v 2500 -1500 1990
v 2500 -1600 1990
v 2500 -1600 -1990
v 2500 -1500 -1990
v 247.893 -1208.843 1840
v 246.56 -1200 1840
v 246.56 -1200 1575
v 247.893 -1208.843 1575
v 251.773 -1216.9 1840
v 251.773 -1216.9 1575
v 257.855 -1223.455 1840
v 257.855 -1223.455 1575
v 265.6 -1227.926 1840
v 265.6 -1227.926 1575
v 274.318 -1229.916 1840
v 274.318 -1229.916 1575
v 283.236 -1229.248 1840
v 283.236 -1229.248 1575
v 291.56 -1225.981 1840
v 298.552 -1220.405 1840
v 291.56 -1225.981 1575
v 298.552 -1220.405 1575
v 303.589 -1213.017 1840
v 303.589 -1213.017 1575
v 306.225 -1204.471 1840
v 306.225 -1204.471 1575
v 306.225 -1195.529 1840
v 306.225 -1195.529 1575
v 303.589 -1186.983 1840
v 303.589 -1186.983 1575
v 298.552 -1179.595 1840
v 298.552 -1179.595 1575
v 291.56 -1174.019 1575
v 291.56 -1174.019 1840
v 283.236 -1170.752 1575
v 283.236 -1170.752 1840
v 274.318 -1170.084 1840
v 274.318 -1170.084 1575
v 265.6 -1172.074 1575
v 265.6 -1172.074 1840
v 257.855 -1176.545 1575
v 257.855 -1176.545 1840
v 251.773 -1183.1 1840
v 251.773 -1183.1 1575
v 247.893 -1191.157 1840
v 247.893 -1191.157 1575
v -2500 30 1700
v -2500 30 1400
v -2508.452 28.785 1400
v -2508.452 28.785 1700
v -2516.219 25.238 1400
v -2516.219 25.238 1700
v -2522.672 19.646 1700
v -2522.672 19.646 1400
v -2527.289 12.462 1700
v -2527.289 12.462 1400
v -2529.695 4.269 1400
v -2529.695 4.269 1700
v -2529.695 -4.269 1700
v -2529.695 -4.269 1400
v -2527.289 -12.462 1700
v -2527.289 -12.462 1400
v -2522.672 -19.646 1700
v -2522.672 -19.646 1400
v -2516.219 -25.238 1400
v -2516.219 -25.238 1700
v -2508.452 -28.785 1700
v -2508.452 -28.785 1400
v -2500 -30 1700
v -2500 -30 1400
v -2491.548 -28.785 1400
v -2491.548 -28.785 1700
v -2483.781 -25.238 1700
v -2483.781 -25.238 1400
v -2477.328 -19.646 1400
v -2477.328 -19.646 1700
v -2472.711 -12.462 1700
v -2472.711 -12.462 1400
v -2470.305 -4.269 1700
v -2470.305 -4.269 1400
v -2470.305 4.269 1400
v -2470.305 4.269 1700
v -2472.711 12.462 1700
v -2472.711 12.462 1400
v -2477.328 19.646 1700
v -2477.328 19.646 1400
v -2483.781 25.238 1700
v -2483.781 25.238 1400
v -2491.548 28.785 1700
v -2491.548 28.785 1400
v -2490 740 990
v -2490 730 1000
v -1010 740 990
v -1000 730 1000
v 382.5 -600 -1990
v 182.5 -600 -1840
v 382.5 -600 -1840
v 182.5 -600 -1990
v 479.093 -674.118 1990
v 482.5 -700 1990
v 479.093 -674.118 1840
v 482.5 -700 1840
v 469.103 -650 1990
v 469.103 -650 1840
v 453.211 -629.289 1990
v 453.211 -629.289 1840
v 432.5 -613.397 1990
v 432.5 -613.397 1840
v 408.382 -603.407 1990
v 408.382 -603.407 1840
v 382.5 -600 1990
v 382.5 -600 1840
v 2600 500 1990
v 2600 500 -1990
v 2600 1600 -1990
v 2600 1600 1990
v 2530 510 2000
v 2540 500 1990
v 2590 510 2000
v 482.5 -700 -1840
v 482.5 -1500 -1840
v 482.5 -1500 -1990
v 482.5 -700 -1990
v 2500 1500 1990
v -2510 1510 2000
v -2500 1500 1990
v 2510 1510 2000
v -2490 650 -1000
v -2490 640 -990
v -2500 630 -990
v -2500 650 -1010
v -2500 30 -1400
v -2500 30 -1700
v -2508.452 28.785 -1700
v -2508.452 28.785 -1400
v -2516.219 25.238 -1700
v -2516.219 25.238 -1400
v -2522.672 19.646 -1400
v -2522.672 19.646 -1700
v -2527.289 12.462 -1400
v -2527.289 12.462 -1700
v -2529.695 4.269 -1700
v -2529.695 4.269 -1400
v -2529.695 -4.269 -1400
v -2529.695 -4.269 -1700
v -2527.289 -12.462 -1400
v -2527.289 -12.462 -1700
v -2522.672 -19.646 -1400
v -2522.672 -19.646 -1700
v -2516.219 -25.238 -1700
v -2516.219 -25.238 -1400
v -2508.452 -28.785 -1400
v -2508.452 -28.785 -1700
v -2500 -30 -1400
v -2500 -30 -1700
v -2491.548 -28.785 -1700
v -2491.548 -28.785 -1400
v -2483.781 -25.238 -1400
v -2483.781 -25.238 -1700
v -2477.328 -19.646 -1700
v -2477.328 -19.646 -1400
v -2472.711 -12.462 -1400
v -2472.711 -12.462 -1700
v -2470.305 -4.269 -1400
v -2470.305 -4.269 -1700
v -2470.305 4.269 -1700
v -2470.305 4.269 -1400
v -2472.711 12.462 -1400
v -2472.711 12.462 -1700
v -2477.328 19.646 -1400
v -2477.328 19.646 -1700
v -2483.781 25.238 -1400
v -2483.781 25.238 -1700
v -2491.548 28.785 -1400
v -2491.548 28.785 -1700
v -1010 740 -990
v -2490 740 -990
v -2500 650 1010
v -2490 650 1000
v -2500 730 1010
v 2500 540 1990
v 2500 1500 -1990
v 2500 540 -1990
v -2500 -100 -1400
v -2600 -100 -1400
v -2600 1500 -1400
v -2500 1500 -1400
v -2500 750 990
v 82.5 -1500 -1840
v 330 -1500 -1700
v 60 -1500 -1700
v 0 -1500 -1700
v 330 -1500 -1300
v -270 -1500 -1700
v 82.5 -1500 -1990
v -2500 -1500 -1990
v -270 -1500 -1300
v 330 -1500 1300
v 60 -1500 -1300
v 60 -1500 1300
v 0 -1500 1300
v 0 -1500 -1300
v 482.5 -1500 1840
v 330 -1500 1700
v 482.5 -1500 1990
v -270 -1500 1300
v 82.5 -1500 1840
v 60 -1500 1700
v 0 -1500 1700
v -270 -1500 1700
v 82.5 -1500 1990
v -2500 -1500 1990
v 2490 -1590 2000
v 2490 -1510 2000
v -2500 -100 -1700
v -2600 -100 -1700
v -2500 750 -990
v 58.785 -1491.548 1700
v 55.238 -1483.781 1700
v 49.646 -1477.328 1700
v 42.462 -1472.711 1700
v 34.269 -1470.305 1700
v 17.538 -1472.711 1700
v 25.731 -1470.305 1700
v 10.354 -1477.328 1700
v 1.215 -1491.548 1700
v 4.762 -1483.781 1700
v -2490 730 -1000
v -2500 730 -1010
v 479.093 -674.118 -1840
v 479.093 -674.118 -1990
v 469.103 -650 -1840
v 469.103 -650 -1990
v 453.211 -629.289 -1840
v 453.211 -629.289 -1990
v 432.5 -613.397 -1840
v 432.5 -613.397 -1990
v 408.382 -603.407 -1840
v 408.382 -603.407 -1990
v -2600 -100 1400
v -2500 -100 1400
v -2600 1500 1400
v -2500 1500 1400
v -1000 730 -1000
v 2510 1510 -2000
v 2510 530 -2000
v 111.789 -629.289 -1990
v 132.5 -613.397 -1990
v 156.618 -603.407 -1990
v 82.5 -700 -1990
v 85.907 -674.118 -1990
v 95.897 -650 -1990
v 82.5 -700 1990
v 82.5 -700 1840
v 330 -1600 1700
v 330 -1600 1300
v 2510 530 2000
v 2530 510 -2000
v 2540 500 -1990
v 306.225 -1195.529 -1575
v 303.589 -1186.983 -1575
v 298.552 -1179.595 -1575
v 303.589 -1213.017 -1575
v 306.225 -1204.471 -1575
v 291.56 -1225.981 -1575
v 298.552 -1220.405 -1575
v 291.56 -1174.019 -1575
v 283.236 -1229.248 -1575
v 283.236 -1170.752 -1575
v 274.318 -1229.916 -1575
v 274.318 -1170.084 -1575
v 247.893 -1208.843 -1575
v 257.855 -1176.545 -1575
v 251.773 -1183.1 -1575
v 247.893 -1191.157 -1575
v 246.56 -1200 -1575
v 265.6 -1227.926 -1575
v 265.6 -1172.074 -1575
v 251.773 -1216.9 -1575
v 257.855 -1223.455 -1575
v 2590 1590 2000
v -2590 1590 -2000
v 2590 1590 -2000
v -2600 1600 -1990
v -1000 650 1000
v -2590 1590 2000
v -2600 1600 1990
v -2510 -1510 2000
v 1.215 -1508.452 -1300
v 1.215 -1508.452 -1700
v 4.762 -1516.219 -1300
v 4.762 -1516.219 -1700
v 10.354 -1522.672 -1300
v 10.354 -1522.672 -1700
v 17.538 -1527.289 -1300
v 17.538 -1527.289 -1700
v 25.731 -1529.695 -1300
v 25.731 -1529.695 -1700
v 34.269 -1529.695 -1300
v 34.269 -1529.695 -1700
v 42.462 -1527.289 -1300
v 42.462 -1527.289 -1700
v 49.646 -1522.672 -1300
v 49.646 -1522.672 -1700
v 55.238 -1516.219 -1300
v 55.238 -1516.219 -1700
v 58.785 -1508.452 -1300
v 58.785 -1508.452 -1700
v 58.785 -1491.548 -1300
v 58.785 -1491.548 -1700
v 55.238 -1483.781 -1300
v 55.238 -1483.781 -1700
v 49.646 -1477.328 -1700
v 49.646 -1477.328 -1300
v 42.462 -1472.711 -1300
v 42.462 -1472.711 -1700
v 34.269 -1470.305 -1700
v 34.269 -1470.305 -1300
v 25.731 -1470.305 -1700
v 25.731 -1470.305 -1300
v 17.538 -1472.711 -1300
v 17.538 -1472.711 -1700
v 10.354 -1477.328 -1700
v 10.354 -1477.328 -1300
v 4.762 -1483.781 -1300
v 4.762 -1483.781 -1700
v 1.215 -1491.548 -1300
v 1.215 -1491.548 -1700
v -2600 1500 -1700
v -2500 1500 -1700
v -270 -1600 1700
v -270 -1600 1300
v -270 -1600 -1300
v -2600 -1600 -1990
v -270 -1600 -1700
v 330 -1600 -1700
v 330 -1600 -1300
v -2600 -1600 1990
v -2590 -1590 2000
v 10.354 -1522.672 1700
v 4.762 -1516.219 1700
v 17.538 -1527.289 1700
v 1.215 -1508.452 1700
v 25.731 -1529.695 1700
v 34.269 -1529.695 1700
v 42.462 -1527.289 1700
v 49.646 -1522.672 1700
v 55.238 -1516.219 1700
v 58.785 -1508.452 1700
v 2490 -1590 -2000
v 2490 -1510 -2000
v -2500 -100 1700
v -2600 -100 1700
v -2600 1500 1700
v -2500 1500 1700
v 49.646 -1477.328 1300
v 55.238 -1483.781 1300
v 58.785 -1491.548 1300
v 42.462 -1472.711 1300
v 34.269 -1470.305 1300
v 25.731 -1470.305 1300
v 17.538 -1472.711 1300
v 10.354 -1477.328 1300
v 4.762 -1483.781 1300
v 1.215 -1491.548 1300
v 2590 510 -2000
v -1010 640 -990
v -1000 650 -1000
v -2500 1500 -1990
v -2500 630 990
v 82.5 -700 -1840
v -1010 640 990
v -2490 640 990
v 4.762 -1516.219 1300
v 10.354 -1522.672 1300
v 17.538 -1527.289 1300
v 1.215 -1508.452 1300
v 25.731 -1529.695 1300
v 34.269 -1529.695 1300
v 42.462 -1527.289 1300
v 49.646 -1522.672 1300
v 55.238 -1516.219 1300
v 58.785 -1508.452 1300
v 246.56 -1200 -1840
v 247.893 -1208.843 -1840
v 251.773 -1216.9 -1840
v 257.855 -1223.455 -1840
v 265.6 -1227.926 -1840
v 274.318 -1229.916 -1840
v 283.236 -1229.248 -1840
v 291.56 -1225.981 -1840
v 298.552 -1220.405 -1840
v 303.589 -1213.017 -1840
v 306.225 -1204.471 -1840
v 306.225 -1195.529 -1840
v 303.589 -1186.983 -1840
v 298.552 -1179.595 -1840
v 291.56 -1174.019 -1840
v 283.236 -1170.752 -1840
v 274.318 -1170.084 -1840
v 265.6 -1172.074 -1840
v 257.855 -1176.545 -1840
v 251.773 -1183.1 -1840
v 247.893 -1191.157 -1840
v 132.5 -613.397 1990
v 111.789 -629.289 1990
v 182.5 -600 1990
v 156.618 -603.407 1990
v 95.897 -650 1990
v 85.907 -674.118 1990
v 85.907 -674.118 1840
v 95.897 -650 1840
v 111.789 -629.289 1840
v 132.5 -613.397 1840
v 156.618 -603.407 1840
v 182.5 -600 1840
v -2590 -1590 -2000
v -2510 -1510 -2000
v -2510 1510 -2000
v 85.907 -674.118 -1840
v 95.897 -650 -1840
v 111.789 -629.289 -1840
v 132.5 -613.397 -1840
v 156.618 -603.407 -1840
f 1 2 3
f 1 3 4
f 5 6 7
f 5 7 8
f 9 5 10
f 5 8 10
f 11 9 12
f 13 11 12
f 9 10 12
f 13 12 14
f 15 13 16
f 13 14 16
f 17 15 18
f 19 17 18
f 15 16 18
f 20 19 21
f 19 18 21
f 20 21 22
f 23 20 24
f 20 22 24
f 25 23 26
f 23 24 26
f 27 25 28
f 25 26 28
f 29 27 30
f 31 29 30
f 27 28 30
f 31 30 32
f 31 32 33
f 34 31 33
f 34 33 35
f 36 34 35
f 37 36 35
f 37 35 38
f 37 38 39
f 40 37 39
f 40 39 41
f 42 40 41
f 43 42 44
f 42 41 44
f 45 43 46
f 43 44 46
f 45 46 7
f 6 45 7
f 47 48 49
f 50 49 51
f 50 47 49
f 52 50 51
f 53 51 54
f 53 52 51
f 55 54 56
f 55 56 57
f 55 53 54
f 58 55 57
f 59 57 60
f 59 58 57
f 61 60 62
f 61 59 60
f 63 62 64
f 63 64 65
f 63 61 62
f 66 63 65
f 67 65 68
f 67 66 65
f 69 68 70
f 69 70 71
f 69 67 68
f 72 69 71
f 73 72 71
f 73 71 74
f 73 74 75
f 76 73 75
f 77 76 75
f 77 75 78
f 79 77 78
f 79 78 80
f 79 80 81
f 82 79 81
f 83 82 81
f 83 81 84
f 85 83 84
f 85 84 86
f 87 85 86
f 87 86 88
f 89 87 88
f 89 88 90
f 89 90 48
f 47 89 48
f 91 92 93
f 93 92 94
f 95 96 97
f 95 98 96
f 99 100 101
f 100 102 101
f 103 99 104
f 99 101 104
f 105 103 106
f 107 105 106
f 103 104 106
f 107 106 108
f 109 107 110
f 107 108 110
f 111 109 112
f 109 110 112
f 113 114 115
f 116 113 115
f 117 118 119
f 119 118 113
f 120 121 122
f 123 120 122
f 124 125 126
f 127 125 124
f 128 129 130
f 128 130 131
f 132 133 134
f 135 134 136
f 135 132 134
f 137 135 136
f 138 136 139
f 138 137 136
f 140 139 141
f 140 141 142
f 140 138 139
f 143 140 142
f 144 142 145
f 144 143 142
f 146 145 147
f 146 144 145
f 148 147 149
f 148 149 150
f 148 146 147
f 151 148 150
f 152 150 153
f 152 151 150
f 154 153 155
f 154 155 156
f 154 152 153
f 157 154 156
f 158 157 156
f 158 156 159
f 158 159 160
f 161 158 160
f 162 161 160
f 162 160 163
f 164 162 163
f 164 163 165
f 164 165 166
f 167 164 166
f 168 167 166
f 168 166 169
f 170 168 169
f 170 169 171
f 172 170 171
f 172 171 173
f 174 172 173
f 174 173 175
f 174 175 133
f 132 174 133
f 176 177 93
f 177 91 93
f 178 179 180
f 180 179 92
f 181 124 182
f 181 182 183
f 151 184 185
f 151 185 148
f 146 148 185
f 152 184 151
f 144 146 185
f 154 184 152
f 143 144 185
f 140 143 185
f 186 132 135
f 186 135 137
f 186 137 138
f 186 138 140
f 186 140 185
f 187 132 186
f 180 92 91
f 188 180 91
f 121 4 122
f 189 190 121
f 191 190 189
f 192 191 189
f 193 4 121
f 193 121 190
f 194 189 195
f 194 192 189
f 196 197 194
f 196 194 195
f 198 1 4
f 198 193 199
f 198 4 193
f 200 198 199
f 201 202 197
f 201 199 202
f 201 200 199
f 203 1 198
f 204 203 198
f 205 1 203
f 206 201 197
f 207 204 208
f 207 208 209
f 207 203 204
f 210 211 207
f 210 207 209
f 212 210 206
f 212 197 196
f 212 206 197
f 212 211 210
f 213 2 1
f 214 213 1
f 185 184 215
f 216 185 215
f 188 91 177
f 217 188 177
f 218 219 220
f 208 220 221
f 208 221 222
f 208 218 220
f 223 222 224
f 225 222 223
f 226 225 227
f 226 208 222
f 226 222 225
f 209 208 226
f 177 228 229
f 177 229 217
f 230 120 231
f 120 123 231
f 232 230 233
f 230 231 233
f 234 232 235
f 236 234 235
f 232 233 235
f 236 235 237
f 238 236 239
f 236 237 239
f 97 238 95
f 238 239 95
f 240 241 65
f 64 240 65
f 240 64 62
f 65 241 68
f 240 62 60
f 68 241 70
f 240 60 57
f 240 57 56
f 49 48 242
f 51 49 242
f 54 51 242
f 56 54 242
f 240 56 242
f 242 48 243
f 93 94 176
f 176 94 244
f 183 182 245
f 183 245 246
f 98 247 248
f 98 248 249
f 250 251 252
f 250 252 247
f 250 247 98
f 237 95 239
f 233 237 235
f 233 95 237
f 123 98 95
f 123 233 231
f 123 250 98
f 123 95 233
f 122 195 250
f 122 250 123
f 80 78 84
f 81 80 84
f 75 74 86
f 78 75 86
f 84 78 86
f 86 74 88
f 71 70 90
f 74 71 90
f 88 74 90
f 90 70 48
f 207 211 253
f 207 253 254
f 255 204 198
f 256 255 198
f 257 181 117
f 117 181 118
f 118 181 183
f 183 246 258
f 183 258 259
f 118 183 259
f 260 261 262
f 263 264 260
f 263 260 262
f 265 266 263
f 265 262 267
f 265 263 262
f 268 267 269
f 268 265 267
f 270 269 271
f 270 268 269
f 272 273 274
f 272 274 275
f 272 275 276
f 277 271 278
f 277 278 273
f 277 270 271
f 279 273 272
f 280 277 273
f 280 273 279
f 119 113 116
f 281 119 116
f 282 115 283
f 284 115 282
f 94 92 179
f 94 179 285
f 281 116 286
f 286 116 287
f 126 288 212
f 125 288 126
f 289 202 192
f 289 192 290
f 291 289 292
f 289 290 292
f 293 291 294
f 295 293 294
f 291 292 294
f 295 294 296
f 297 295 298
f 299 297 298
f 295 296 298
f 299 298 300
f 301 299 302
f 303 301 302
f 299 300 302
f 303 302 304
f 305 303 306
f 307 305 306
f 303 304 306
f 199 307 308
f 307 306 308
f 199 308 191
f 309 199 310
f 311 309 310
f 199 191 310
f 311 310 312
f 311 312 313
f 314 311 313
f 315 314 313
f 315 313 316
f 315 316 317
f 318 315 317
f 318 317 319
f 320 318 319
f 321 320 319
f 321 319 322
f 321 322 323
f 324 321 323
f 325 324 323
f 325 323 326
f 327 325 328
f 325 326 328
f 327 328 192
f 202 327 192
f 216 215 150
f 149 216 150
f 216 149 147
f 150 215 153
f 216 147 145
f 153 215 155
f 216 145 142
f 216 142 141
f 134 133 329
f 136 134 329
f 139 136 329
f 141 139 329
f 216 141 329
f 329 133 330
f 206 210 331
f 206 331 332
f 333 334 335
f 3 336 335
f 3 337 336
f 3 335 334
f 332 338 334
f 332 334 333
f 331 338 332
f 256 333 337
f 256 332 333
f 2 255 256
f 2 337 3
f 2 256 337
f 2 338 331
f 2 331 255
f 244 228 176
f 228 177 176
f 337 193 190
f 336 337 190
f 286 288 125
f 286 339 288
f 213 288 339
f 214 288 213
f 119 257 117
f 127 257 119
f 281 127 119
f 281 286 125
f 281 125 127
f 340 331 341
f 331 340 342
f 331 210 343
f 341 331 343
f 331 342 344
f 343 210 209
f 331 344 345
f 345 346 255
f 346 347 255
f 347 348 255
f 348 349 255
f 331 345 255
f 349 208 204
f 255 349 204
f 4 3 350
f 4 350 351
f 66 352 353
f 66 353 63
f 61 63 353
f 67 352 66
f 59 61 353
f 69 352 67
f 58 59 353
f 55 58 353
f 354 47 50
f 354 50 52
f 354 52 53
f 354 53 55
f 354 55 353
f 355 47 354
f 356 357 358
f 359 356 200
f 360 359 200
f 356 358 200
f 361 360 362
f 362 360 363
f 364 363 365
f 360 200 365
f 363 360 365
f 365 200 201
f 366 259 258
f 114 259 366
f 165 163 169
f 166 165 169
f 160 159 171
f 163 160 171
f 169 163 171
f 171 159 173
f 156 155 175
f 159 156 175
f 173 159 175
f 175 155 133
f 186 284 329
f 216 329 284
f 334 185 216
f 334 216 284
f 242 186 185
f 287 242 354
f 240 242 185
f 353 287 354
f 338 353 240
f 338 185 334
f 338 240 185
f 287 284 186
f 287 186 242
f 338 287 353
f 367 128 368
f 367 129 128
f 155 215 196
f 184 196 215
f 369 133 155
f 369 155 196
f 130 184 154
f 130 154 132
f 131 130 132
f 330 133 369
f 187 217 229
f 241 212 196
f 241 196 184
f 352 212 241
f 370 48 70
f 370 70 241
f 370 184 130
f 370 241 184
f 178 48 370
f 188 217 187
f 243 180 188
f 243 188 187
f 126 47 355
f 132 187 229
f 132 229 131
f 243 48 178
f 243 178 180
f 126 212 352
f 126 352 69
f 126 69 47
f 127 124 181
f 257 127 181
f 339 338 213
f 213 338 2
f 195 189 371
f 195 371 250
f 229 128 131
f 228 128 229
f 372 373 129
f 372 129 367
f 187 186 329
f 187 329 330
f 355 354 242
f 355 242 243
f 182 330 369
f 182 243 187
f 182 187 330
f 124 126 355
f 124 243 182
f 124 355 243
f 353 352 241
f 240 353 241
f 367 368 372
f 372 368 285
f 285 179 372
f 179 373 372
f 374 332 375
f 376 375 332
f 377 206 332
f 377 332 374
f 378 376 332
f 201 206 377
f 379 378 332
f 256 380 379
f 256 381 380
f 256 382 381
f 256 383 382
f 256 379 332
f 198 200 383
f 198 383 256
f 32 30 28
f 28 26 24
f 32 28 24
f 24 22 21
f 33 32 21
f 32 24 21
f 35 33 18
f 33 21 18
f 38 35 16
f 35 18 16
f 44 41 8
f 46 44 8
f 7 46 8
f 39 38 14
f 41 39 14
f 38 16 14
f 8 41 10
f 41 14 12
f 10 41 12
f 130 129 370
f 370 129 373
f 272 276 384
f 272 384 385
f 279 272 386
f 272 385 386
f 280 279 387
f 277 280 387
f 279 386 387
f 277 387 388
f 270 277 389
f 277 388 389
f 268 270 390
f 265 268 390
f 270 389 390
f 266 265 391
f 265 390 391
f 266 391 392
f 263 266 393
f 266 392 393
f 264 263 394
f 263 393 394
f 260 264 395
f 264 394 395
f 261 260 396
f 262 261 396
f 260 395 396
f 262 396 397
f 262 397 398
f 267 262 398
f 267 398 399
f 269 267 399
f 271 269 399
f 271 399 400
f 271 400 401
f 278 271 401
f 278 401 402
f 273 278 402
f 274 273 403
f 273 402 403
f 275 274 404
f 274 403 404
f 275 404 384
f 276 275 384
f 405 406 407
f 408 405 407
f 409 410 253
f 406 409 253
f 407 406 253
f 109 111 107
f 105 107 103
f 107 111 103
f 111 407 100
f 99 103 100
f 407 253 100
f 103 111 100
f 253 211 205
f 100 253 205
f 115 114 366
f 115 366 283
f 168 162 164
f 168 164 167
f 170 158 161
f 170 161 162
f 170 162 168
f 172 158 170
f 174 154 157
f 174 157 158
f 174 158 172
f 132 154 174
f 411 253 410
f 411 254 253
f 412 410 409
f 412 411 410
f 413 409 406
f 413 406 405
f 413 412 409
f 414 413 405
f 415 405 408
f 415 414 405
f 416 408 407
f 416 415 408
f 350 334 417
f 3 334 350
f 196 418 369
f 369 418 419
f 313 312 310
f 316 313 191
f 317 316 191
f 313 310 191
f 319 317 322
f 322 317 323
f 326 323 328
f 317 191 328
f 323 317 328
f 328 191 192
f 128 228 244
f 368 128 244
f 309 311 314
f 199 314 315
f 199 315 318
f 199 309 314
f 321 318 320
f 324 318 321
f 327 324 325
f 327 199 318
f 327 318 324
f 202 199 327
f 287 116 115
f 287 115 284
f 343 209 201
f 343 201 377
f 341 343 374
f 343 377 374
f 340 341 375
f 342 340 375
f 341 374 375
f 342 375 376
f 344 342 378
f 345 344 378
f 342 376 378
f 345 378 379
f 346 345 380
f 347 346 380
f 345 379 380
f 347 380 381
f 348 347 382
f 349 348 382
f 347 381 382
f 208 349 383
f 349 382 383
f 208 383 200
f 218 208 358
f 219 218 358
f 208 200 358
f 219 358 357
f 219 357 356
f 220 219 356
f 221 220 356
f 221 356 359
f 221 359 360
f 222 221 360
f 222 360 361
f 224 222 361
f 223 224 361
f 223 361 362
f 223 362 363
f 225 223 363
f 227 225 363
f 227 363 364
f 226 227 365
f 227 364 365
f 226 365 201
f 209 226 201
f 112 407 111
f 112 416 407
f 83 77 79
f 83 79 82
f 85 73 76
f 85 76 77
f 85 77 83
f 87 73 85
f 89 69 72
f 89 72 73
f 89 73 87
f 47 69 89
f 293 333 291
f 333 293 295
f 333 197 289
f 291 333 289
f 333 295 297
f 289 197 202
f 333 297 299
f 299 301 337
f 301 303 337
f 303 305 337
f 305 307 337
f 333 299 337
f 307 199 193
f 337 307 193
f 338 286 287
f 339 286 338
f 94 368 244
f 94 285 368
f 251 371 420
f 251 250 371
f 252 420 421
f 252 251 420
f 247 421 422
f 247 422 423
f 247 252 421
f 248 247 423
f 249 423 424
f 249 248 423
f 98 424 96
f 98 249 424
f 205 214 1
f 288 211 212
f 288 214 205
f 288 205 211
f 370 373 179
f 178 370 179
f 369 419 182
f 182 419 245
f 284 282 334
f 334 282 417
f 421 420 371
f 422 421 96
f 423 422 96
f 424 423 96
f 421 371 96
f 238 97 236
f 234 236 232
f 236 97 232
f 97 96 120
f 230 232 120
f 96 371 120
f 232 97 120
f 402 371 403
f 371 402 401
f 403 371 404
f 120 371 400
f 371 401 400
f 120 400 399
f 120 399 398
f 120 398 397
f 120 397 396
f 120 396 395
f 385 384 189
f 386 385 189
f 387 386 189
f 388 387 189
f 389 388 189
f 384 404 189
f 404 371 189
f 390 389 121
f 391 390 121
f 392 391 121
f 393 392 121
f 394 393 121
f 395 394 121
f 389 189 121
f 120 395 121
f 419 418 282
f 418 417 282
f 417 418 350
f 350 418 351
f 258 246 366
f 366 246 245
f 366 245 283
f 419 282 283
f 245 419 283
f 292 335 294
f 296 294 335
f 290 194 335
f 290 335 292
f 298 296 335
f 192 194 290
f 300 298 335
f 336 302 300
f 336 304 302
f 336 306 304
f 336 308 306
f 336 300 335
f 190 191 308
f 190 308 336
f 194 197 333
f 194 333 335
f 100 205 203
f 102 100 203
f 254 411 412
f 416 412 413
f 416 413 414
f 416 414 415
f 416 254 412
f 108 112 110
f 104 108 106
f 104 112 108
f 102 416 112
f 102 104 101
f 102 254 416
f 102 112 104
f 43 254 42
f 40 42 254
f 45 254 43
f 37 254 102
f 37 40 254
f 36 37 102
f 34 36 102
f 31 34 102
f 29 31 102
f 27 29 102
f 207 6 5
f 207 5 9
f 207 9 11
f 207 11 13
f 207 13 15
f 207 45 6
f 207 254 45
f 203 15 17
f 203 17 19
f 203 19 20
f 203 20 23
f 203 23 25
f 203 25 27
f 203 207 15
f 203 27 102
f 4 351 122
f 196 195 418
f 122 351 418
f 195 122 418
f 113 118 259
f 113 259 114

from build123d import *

# Parameters (mm, degrees)
BOSS_EXTRUDE1_DEPTH  = 2000
SKETCH4_W            = 600
SKETCH4_H            = 400
CUT_EXTRUDE1_DEPTH   = 4514.313638559
BOSS_EXTRUDE5_START  = 1300
SKETCH5_R            = 30
BOSS_EXTRUDE5_DEPTH  = 400
BOSS_EXTRUDE6_START  = -1700
SKETCH5_2_R          = 30
BOSS_EXTRUDE6_DEPTH  = 400
SKETCH6_W            = 300
SKETCH6_H            = 1600
CUT_EXTRUDE2_DEPTH   = 5708.013229352
BOSS_EXTRUDE7_START  = -1400
SKETCH7_R            = 30
BOSS_EXTRUDE7_DEPTH  = 300
BOSS_EXTRUDE8_START  = 1700
SKETCH7_2_R          = 30
BOSS_EXTRUDE8_DEPTH  = 300
SKETCH10_W           = 1500
SKETCH10_H           = 100
BOSS_EXTRUDE9_DEPTH  = 1000
CHAMFER1_SIZE        = 10
SKETCH12_W           = 400
SKETCH12_H           = 150
BOSS_EXTRUDE10_DEPTH = 900
FILLET4_R            = 100
BOSS_EXTRUDE11_START = 1575
SKETCH13_R           = 30
BOSS_EXTRUDE11_DEPTH = 265
BOSS_EXTRUDE12_START = -1840
SKETCH13_2_R         = 30
BOSS_EXTRUDE12_DEPTH = 265
CHAMFER4_SIZE        = 40


with BuildPart() as part:
    # Sketch1 → Boss-Extrude1 (new, symmetric)
    with BuildSketch(Plane.XY):
        Polygon((2500, -1500), (-2500, -1500), (-2500, 700), (-2500, 1500), (2500, 1500), (2500, 500), (2600, 500), (2600, 1600), (-2600, 1600), (-2600, -1600), (2500, -1600), align=None)
    extrude(amount=BOSS_EXTRUDE1_DEPTH, both=True)

    # Sketch4 → Cut-Extrude1 (cut, through all)
    with BuildSketch(Plane(origin=(0, -1500, 0), x_dir=(1, 0, 0), z_dir=(0, 1, 0))):
        with Locations((30, -1500)):
            Rectangle(SKETCH4_W, SKETCH4_H)
        with Locations((30, 1500)):
            Rectangle(SKETCH4_W, SKETCH4_H)
    extrude(amount=-CUT_EXTRUDE1_DEPTH, mode=Mode.SUBTRACT)

    # Sketch5 → Boss-Extrude5 (add)
    with BuildSketch(Plane.XY.offset(BOSS_EXTRUDE5_START)):
        with Locations(Location((30, -1500, 0), (0, 0, 180))):
            Circle(SKETCH5_R)
    extrude(amount=BOSS_EXTRUDE5_DEPTH)

    # Sketch5<2> → Boss-Extrude6 (add)
    with BuildSketch(Plane.XY.offset(BOSS_EXTRUDE6_START)):
        with Locations(Location((30, -1500, 0), (0, 0, 180))):
            Circle(SKETCH5_2_R)
    extrude(amount=BOSS_EXTRUDE6_DEPTH)

    # Sketch6 → Cut-Extrude2 (cut, through all)
    with BuildSketch(Plane(origin=(-2500, 0, 0), x_dir=(0, 0, -1), z_dir=(1, 0, 0))):
        with Locations((-1550, 700)):
            Rectangle(SKETCH6_W, SKETCH6_H)
        with Locations((1550, 700)):
            Rectangle(SKETCH6_W, SKETCH6_H)
    extrude(amount=-CUT_EXTRUDE2_DEPTH, mode=Mode.SUBTRACT)

    # Sketch7 → Boss-Extrude7 (add)
    with BuildSketch(Plane.XY.offset(BOSS_EXTRUDE7_START)):
        with Locations(Location((-2500, 0, 0), (0, 0, 90))):
            Circle(SKETCH7_R)
    extrude(amount=-BOSS_EXTRUDE7_DEPTH)

    # Sketch7<2> → Boss-Extrude8 (add)
    with BuildSketch(Plane.XY.offset(BOSS_EXTRUDE8_START)):
        with Locations(Location((-2500, 0, 0), (0, 0, 90))):
            Circle(SKETCH7_2_R)
    extrude(amount=-BOSS_EXTRUDE8_DEPTH)

    # Sketch10 → Boss-Extrude9 (add, symmetric)
    with BuildSketch(Plane.XY):
        with Locations((-1750, 690)):
            Rectangle(SKETCH10_W, SKETCH10_H)
    extrude(amount=BOSS_EXTRUDE9_DEPTH, both=True)

    # Chamfer1
    chamfer1_edges = [part.edges().sort_by_distance(p)[0] for p in [
        (2500, -1550, -2000),
        (-50, -1600, -2000),
        (-2600, 0, -2000),
        (0, 1600, -2000),
        (2600, 1050, -2000),
        (2550, 500, -2000),
        (2500, 1000, -2000),
        (-1000, 640, 0),
        (-1750, 740, -1000),
        (-1000, 740, 0),
        (-2500, 690, -1000),
        (-2500, 740, 0),
        (0, 1500, -2000),
        (-1750, 640, -1000),
        (-2500, 640, 0),
        (-1750, 740, 1000),
        (0, 1500, 2000),
        (-2500, 690, 1000),
        (-1750, 640, 1000),
        (-2500, 0, -2000),
        (0, -1500, -2000),
        (2500, 1000, 2000),
        (2550, 500, 2000),
        (2600, 1050, 2000),
        (0, 1600, 2000),
        (-2600, 0, 2000),
        (-50, -1600, 2000),
        (2500, -1550, 2000),
        (0, -1500, 2000),
        (-2500, 0, 2000),
    ]]
    chamfer(chamfer1_edges, length=CHAMFER1_SIZE)

    # Sketch12 → Boss-Extrude10 (add)
    with BuildSketch(Plane(origin=(0, -1500, 0), x_dir=(1, 0, 0), z_dir=(0, 1, 0))):
        with Locations((282.5, -1915)):
            Rectangle(SKETCH12_W, SKETCH12_H)
        with Locations((282.5, 1915)):
            Rectangle(SKETCH12_W, SKETCH12_H)
    extrude(amount=BOSS_EXTRUDE10_DEPTH)

    # Fillet4
    fillet4_edges = [part.edges().sort_by_distance(p)[0] for p in [
        (482.5, -600, 1915),
        (82.5, -600, 1915),
        (82.5, -600, -1915),
        (482.5, -600, -1915),
    ]]
    fillet(fillet4_edges, radius=FILLET4_R)

    # Sketch13 → Boss-Extrude11 (add)
    with BuildSketch(Plane.XY.offset(BOSS_EXTRUDE11_START)):
        with Locations(Location((276.56, -1200, 0), (0, 0, 180))):
            Circle(SKETCH13_R)
    extrude(amount=BOSS_EXTRUDE11_DEPTH)

    # Sketch13<2> → Boss-Extrude12 (add)
    with BuildSketch(Plane.XY.offset(BOSS_EXTRUDE12_START)):
        with Locations(Location((276.56, -1200, 0), (0, 0, 180))):
            Circle(SKETCH13_2_R)
    extrude(amount=BOSS_EXTRUDE12_DEPTH)

    # Chamfer4
    # the kernel refuses this chamfer: 40 mm, written as the material it takes off along each edge
    with BuildSketch(Plane(origin=(2500, 500, -2092.867319519), x_dir=(-0.02749587661058214, 0.9996219169112969, 0), z_dir=(0, 0, 1))) as chamfer4_piece_1:
        Polygon((CHAMFER4_SIZE * 0.999621916911, -CHAMFER4_SIZE * 0.0274958766106), (-CHAMFER4_SIZE * 0.0274958766106, -CHAMFER4_SIZE * 0.999621916911), (0, 0), align=None)
    extrude(amount=4185.734639037, mode=Mode.SUBTRACT)


solid = part.part
